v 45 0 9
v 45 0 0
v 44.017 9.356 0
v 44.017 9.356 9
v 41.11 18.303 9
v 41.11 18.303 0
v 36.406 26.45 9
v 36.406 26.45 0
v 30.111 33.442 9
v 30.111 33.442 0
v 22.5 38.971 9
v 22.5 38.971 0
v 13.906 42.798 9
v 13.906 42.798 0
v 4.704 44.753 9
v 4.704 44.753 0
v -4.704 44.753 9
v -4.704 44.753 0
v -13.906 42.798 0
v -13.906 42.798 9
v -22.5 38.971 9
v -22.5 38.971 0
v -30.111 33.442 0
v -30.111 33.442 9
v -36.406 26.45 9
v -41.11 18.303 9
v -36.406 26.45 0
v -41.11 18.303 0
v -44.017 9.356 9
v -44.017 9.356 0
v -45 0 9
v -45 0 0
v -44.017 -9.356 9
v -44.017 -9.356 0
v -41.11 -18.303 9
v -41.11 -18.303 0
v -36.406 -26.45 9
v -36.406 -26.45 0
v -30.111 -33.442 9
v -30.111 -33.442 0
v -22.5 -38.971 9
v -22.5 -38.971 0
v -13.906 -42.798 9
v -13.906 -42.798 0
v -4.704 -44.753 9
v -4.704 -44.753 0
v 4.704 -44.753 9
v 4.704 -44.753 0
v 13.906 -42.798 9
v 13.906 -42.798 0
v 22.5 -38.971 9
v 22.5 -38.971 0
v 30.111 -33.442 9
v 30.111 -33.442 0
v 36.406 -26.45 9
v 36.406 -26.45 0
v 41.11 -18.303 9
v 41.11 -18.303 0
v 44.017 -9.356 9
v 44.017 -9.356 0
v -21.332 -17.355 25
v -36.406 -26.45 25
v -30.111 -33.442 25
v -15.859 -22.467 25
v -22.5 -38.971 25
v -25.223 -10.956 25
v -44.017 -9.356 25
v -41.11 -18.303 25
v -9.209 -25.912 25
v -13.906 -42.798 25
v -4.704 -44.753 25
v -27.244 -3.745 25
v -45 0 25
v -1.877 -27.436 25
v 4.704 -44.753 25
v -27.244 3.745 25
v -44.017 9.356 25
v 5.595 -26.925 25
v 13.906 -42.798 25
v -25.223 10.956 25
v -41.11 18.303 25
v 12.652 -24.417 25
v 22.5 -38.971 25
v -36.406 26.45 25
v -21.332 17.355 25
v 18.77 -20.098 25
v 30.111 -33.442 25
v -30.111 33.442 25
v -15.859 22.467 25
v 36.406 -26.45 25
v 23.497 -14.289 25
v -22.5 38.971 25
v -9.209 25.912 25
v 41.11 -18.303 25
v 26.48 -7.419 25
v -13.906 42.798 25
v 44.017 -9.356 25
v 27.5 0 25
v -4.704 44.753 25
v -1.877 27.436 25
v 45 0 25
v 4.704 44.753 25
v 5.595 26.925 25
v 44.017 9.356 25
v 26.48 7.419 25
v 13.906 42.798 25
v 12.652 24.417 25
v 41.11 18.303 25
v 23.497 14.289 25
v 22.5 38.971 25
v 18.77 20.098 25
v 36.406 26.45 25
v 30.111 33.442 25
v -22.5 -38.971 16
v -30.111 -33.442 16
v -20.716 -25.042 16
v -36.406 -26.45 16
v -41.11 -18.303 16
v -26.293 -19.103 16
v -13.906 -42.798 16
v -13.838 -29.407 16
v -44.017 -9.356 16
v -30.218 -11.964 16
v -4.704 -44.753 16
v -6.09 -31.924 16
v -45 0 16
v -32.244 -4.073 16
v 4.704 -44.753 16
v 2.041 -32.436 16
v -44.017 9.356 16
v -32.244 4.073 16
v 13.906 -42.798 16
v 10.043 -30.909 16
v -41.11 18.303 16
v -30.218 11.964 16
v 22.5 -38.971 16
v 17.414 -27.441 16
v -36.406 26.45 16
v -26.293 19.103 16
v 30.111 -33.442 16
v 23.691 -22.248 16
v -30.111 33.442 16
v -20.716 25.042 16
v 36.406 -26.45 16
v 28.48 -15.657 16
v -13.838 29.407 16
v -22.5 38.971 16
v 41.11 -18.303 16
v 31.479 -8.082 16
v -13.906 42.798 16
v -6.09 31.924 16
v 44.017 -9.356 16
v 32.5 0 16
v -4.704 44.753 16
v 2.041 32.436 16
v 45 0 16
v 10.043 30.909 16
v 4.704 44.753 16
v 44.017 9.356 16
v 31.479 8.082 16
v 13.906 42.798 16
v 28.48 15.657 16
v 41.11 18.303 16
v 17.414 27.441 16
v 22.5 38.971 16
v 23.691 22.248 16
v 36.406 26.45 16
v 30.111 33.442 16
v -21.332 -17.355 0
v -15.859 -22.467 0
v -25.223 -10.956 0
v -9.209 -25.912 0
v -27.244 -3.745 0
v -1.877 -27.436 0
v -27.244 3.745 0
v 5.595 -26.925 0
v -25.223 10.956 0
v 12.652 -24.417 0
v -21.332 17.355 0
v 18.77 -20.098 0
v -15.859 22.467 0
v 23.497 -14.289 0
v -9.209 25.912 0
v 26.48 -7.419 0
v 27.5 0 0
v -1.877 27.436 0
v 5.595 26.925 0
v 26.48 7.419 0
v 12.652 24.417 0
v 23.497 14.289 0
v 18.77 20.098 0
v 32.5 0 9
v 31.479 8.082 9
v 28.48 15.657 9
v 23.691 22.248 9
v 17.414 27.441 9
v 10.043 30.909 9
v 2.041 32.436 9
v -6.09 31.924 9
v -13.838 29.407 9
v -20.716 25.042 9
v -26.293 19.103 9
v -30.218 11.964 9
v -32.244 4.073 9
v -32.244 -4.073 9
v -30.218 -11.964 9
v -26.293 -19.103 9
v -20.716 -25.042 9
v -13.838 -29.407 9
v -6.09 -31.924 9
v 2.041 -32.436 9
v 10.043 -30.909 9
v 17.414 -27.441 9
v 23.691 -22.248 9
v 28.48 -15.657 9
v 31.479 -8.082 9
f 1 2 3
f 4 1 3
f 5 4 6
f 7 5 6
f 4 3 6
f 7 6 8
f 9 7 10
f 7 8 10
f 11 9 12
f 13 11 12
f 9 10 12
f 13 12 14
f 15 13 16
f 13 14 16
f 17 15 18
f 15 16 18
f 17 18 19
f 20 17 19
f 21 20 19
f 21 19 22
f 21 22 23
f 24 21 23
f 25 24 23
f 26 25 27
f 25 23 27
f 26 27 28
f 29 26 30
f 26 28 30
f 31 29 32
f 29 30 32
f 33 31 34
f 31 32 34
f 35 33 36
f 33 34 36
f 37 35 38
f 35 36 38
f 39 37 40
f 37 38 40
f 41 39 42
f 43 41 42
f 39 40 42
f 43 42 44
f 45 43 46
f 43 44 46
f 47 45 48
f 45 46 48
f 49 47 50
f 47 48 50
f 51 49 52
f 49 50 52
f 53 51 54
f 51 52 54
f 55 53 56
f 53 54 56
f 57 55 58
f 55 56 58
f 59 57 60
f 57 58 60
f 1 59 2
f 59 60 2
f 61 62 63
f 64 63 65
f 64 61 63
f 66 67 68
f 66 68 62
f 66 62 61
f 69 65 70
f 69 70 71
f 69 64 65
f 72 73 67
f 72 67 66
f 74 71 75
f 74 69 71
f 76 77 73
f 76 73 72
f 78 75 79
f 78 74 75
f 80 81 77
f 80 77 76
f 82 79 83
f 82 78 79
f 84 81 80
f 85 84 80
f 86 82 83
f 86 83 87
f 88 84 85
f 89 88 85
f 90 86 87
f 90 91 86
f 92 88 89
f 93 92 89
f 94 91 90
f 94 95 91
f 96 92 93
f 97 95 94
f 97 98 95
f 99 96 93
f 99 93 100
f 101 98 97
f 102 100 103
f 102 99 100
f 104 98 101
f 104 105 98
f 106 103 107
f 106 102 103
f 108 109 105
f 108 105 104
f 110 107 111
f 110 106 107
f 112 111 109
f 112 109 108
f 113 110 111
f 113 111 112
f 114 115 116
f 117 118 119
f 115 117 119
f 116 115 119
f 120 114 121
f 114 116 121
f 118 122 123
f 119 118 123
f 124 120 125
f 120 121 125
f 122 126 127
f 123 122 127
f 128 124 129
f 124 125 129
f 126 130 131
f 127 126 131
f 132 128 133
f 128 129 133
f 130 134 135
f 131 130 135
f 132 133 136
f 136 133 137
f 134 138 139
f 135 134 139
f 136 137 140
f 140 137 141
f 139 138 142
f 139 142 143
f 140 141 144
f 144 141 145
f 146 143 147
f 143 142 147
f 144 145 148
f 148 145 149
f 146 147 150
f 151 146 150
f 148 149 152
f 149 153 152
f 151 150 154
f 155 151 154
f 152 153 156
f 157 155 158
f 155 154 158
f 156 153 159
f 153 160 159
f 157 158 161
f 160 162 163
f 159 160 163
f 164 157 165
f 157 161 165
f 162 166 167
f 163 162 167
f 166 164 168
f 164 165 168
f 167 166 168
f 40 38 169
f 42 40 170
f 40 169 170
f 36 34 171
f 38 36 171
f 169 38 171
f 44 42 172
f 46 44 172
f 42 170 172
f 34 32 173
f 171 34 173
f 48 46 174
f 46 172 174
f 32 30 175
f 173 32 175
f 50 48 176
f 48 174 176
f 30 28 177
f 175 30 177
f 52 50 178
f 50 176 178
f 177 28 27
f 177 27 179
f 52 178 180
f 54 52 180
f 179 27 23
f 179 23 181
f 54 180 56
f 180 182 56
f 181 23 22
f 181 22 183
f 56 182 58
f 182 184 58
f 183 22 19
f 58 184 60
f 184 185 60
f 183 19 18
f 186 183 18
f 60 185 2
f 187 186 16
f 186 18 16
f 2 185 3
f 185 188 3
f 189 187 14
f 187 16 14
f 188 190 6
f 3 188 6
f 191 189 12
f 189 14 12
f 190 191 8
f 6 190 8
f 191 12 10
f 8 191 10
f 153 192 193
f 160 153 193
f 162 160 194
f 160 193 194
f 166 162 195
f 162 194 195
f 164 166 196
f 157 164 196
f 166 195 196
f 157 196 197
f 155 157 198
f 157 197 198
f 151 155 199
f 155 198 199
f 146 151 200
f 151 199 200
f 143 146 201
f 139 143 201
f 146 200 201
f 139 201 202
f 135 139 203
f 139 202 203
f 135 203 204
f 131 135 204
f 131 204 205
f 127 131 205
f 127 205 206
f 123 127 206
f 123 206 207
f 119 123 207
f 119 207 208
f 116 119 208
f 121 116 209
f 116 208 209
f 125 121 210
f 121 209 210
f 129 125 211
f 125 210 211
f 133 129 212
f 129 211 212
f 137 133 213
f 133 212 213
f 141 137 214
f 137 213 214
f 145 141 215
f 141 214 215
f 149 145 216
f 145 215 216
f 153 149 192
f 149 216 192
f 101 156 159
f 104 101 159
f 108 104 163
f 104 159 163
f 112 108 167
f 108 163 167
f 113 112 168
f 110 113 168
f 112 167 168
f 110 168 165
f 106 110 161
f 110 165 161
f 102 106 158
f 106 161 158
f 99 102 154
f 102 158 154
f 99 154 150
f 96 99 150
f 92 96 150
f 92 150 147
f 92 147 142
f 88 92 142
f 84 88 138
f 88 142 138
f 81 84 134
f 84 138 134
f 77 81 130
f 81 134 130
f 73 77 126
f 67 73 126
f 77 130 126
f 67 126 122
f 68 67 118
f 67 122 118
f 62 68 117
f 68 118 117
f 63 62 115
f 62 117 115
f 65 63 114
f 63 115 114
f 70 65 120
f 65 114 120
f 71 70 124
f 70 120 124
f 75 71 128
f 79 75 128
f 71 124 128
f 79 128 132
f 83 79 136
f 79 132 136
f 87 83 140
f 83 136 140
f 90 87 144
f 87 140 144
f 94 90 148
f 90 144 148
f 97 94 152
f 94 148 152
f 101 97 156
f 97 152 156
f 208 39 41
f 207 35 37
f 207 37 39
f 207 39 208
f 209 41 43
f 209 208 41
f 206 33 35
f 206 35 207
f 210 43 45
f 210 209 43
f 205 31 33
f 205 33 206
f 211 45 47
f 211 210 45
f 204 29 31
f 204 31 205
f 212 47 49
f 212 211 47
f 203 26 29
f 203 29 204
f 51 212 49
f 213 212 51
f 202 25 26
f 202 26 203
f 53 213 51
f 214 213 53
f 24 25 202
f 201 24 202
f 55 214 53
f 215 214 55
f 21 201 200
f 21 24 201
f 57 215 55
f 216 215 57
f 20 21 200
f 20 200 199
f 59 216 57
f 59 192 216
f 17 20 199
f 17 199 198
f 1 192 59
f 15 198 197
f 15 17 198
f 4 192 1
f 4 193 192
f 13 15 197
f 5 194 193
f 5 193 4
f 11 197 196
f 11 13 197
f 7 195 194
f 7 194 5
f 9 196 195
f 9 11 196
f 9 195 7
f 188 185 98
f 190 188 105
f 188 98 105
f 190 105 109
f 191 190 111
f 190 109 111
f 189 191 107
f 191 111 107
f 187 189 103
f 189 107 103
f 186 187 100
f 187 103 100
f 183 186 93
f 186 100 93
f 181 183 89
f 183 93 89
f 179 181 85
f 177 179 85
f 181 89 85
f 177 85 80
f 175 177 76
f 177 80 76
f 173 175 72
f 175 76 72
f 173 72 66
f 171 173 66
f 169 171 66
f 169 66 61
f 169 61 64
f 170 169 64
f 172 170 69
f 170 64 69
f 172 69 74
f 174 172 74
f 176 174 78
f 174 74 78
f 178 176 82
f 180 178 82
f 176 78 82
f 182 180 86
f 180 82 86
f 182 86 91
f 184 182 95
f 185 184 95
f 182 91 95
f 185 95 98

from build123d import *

# Parameters (mm, degrees)
SKETCH1_R           = 45
BOSS_EXTRUDE1_DEPTH = 9
SKETCH2_R           = 32.5
BOSS_EXTRUDE4_DEPTH = 7
SKETCH4_R           = 45
BOSS_EXTRUDE5_DEPTH = 9
SKETCH5_R           = 27.5
CUT_EXTRUDE1_DEPTH  = 25


with BuildPart() as part:
    # Sketch1 → Boss-Extrude1 (new body)
    with BuildSketch(Plane.XY):
        Circle(SKETCH1_R)
    extrude(amount=BOSS_EXTRUDE1_DEPTH)

    # Sketch2 → Boss-Extrude4 (add)
    with BuildSketch(Plane.XY.offset(9)):
        Circle(SKETCH2_R)
    extrude(amount=BOSS_EXTRUDE4_DEPTH)

    # Sketch4 → Boss-Extrude5 (add)
    with BuildSketch(Plane.XY.offset(16)):
        Circle(SKETCH4_R)
    extrude(amount=BOSS_EXTRUDE5_DEPTH)

    # Sketch5 → Cut-Extrude1 (cut)
    with BuildSketch(Plane.XY.offset(25)):
        Circle(SKETCH5_R)
    extrude(amount=-CUT_EXTRUDE1_DEPTH, mode=Mode.SUBTRACT)


solid = part.part
